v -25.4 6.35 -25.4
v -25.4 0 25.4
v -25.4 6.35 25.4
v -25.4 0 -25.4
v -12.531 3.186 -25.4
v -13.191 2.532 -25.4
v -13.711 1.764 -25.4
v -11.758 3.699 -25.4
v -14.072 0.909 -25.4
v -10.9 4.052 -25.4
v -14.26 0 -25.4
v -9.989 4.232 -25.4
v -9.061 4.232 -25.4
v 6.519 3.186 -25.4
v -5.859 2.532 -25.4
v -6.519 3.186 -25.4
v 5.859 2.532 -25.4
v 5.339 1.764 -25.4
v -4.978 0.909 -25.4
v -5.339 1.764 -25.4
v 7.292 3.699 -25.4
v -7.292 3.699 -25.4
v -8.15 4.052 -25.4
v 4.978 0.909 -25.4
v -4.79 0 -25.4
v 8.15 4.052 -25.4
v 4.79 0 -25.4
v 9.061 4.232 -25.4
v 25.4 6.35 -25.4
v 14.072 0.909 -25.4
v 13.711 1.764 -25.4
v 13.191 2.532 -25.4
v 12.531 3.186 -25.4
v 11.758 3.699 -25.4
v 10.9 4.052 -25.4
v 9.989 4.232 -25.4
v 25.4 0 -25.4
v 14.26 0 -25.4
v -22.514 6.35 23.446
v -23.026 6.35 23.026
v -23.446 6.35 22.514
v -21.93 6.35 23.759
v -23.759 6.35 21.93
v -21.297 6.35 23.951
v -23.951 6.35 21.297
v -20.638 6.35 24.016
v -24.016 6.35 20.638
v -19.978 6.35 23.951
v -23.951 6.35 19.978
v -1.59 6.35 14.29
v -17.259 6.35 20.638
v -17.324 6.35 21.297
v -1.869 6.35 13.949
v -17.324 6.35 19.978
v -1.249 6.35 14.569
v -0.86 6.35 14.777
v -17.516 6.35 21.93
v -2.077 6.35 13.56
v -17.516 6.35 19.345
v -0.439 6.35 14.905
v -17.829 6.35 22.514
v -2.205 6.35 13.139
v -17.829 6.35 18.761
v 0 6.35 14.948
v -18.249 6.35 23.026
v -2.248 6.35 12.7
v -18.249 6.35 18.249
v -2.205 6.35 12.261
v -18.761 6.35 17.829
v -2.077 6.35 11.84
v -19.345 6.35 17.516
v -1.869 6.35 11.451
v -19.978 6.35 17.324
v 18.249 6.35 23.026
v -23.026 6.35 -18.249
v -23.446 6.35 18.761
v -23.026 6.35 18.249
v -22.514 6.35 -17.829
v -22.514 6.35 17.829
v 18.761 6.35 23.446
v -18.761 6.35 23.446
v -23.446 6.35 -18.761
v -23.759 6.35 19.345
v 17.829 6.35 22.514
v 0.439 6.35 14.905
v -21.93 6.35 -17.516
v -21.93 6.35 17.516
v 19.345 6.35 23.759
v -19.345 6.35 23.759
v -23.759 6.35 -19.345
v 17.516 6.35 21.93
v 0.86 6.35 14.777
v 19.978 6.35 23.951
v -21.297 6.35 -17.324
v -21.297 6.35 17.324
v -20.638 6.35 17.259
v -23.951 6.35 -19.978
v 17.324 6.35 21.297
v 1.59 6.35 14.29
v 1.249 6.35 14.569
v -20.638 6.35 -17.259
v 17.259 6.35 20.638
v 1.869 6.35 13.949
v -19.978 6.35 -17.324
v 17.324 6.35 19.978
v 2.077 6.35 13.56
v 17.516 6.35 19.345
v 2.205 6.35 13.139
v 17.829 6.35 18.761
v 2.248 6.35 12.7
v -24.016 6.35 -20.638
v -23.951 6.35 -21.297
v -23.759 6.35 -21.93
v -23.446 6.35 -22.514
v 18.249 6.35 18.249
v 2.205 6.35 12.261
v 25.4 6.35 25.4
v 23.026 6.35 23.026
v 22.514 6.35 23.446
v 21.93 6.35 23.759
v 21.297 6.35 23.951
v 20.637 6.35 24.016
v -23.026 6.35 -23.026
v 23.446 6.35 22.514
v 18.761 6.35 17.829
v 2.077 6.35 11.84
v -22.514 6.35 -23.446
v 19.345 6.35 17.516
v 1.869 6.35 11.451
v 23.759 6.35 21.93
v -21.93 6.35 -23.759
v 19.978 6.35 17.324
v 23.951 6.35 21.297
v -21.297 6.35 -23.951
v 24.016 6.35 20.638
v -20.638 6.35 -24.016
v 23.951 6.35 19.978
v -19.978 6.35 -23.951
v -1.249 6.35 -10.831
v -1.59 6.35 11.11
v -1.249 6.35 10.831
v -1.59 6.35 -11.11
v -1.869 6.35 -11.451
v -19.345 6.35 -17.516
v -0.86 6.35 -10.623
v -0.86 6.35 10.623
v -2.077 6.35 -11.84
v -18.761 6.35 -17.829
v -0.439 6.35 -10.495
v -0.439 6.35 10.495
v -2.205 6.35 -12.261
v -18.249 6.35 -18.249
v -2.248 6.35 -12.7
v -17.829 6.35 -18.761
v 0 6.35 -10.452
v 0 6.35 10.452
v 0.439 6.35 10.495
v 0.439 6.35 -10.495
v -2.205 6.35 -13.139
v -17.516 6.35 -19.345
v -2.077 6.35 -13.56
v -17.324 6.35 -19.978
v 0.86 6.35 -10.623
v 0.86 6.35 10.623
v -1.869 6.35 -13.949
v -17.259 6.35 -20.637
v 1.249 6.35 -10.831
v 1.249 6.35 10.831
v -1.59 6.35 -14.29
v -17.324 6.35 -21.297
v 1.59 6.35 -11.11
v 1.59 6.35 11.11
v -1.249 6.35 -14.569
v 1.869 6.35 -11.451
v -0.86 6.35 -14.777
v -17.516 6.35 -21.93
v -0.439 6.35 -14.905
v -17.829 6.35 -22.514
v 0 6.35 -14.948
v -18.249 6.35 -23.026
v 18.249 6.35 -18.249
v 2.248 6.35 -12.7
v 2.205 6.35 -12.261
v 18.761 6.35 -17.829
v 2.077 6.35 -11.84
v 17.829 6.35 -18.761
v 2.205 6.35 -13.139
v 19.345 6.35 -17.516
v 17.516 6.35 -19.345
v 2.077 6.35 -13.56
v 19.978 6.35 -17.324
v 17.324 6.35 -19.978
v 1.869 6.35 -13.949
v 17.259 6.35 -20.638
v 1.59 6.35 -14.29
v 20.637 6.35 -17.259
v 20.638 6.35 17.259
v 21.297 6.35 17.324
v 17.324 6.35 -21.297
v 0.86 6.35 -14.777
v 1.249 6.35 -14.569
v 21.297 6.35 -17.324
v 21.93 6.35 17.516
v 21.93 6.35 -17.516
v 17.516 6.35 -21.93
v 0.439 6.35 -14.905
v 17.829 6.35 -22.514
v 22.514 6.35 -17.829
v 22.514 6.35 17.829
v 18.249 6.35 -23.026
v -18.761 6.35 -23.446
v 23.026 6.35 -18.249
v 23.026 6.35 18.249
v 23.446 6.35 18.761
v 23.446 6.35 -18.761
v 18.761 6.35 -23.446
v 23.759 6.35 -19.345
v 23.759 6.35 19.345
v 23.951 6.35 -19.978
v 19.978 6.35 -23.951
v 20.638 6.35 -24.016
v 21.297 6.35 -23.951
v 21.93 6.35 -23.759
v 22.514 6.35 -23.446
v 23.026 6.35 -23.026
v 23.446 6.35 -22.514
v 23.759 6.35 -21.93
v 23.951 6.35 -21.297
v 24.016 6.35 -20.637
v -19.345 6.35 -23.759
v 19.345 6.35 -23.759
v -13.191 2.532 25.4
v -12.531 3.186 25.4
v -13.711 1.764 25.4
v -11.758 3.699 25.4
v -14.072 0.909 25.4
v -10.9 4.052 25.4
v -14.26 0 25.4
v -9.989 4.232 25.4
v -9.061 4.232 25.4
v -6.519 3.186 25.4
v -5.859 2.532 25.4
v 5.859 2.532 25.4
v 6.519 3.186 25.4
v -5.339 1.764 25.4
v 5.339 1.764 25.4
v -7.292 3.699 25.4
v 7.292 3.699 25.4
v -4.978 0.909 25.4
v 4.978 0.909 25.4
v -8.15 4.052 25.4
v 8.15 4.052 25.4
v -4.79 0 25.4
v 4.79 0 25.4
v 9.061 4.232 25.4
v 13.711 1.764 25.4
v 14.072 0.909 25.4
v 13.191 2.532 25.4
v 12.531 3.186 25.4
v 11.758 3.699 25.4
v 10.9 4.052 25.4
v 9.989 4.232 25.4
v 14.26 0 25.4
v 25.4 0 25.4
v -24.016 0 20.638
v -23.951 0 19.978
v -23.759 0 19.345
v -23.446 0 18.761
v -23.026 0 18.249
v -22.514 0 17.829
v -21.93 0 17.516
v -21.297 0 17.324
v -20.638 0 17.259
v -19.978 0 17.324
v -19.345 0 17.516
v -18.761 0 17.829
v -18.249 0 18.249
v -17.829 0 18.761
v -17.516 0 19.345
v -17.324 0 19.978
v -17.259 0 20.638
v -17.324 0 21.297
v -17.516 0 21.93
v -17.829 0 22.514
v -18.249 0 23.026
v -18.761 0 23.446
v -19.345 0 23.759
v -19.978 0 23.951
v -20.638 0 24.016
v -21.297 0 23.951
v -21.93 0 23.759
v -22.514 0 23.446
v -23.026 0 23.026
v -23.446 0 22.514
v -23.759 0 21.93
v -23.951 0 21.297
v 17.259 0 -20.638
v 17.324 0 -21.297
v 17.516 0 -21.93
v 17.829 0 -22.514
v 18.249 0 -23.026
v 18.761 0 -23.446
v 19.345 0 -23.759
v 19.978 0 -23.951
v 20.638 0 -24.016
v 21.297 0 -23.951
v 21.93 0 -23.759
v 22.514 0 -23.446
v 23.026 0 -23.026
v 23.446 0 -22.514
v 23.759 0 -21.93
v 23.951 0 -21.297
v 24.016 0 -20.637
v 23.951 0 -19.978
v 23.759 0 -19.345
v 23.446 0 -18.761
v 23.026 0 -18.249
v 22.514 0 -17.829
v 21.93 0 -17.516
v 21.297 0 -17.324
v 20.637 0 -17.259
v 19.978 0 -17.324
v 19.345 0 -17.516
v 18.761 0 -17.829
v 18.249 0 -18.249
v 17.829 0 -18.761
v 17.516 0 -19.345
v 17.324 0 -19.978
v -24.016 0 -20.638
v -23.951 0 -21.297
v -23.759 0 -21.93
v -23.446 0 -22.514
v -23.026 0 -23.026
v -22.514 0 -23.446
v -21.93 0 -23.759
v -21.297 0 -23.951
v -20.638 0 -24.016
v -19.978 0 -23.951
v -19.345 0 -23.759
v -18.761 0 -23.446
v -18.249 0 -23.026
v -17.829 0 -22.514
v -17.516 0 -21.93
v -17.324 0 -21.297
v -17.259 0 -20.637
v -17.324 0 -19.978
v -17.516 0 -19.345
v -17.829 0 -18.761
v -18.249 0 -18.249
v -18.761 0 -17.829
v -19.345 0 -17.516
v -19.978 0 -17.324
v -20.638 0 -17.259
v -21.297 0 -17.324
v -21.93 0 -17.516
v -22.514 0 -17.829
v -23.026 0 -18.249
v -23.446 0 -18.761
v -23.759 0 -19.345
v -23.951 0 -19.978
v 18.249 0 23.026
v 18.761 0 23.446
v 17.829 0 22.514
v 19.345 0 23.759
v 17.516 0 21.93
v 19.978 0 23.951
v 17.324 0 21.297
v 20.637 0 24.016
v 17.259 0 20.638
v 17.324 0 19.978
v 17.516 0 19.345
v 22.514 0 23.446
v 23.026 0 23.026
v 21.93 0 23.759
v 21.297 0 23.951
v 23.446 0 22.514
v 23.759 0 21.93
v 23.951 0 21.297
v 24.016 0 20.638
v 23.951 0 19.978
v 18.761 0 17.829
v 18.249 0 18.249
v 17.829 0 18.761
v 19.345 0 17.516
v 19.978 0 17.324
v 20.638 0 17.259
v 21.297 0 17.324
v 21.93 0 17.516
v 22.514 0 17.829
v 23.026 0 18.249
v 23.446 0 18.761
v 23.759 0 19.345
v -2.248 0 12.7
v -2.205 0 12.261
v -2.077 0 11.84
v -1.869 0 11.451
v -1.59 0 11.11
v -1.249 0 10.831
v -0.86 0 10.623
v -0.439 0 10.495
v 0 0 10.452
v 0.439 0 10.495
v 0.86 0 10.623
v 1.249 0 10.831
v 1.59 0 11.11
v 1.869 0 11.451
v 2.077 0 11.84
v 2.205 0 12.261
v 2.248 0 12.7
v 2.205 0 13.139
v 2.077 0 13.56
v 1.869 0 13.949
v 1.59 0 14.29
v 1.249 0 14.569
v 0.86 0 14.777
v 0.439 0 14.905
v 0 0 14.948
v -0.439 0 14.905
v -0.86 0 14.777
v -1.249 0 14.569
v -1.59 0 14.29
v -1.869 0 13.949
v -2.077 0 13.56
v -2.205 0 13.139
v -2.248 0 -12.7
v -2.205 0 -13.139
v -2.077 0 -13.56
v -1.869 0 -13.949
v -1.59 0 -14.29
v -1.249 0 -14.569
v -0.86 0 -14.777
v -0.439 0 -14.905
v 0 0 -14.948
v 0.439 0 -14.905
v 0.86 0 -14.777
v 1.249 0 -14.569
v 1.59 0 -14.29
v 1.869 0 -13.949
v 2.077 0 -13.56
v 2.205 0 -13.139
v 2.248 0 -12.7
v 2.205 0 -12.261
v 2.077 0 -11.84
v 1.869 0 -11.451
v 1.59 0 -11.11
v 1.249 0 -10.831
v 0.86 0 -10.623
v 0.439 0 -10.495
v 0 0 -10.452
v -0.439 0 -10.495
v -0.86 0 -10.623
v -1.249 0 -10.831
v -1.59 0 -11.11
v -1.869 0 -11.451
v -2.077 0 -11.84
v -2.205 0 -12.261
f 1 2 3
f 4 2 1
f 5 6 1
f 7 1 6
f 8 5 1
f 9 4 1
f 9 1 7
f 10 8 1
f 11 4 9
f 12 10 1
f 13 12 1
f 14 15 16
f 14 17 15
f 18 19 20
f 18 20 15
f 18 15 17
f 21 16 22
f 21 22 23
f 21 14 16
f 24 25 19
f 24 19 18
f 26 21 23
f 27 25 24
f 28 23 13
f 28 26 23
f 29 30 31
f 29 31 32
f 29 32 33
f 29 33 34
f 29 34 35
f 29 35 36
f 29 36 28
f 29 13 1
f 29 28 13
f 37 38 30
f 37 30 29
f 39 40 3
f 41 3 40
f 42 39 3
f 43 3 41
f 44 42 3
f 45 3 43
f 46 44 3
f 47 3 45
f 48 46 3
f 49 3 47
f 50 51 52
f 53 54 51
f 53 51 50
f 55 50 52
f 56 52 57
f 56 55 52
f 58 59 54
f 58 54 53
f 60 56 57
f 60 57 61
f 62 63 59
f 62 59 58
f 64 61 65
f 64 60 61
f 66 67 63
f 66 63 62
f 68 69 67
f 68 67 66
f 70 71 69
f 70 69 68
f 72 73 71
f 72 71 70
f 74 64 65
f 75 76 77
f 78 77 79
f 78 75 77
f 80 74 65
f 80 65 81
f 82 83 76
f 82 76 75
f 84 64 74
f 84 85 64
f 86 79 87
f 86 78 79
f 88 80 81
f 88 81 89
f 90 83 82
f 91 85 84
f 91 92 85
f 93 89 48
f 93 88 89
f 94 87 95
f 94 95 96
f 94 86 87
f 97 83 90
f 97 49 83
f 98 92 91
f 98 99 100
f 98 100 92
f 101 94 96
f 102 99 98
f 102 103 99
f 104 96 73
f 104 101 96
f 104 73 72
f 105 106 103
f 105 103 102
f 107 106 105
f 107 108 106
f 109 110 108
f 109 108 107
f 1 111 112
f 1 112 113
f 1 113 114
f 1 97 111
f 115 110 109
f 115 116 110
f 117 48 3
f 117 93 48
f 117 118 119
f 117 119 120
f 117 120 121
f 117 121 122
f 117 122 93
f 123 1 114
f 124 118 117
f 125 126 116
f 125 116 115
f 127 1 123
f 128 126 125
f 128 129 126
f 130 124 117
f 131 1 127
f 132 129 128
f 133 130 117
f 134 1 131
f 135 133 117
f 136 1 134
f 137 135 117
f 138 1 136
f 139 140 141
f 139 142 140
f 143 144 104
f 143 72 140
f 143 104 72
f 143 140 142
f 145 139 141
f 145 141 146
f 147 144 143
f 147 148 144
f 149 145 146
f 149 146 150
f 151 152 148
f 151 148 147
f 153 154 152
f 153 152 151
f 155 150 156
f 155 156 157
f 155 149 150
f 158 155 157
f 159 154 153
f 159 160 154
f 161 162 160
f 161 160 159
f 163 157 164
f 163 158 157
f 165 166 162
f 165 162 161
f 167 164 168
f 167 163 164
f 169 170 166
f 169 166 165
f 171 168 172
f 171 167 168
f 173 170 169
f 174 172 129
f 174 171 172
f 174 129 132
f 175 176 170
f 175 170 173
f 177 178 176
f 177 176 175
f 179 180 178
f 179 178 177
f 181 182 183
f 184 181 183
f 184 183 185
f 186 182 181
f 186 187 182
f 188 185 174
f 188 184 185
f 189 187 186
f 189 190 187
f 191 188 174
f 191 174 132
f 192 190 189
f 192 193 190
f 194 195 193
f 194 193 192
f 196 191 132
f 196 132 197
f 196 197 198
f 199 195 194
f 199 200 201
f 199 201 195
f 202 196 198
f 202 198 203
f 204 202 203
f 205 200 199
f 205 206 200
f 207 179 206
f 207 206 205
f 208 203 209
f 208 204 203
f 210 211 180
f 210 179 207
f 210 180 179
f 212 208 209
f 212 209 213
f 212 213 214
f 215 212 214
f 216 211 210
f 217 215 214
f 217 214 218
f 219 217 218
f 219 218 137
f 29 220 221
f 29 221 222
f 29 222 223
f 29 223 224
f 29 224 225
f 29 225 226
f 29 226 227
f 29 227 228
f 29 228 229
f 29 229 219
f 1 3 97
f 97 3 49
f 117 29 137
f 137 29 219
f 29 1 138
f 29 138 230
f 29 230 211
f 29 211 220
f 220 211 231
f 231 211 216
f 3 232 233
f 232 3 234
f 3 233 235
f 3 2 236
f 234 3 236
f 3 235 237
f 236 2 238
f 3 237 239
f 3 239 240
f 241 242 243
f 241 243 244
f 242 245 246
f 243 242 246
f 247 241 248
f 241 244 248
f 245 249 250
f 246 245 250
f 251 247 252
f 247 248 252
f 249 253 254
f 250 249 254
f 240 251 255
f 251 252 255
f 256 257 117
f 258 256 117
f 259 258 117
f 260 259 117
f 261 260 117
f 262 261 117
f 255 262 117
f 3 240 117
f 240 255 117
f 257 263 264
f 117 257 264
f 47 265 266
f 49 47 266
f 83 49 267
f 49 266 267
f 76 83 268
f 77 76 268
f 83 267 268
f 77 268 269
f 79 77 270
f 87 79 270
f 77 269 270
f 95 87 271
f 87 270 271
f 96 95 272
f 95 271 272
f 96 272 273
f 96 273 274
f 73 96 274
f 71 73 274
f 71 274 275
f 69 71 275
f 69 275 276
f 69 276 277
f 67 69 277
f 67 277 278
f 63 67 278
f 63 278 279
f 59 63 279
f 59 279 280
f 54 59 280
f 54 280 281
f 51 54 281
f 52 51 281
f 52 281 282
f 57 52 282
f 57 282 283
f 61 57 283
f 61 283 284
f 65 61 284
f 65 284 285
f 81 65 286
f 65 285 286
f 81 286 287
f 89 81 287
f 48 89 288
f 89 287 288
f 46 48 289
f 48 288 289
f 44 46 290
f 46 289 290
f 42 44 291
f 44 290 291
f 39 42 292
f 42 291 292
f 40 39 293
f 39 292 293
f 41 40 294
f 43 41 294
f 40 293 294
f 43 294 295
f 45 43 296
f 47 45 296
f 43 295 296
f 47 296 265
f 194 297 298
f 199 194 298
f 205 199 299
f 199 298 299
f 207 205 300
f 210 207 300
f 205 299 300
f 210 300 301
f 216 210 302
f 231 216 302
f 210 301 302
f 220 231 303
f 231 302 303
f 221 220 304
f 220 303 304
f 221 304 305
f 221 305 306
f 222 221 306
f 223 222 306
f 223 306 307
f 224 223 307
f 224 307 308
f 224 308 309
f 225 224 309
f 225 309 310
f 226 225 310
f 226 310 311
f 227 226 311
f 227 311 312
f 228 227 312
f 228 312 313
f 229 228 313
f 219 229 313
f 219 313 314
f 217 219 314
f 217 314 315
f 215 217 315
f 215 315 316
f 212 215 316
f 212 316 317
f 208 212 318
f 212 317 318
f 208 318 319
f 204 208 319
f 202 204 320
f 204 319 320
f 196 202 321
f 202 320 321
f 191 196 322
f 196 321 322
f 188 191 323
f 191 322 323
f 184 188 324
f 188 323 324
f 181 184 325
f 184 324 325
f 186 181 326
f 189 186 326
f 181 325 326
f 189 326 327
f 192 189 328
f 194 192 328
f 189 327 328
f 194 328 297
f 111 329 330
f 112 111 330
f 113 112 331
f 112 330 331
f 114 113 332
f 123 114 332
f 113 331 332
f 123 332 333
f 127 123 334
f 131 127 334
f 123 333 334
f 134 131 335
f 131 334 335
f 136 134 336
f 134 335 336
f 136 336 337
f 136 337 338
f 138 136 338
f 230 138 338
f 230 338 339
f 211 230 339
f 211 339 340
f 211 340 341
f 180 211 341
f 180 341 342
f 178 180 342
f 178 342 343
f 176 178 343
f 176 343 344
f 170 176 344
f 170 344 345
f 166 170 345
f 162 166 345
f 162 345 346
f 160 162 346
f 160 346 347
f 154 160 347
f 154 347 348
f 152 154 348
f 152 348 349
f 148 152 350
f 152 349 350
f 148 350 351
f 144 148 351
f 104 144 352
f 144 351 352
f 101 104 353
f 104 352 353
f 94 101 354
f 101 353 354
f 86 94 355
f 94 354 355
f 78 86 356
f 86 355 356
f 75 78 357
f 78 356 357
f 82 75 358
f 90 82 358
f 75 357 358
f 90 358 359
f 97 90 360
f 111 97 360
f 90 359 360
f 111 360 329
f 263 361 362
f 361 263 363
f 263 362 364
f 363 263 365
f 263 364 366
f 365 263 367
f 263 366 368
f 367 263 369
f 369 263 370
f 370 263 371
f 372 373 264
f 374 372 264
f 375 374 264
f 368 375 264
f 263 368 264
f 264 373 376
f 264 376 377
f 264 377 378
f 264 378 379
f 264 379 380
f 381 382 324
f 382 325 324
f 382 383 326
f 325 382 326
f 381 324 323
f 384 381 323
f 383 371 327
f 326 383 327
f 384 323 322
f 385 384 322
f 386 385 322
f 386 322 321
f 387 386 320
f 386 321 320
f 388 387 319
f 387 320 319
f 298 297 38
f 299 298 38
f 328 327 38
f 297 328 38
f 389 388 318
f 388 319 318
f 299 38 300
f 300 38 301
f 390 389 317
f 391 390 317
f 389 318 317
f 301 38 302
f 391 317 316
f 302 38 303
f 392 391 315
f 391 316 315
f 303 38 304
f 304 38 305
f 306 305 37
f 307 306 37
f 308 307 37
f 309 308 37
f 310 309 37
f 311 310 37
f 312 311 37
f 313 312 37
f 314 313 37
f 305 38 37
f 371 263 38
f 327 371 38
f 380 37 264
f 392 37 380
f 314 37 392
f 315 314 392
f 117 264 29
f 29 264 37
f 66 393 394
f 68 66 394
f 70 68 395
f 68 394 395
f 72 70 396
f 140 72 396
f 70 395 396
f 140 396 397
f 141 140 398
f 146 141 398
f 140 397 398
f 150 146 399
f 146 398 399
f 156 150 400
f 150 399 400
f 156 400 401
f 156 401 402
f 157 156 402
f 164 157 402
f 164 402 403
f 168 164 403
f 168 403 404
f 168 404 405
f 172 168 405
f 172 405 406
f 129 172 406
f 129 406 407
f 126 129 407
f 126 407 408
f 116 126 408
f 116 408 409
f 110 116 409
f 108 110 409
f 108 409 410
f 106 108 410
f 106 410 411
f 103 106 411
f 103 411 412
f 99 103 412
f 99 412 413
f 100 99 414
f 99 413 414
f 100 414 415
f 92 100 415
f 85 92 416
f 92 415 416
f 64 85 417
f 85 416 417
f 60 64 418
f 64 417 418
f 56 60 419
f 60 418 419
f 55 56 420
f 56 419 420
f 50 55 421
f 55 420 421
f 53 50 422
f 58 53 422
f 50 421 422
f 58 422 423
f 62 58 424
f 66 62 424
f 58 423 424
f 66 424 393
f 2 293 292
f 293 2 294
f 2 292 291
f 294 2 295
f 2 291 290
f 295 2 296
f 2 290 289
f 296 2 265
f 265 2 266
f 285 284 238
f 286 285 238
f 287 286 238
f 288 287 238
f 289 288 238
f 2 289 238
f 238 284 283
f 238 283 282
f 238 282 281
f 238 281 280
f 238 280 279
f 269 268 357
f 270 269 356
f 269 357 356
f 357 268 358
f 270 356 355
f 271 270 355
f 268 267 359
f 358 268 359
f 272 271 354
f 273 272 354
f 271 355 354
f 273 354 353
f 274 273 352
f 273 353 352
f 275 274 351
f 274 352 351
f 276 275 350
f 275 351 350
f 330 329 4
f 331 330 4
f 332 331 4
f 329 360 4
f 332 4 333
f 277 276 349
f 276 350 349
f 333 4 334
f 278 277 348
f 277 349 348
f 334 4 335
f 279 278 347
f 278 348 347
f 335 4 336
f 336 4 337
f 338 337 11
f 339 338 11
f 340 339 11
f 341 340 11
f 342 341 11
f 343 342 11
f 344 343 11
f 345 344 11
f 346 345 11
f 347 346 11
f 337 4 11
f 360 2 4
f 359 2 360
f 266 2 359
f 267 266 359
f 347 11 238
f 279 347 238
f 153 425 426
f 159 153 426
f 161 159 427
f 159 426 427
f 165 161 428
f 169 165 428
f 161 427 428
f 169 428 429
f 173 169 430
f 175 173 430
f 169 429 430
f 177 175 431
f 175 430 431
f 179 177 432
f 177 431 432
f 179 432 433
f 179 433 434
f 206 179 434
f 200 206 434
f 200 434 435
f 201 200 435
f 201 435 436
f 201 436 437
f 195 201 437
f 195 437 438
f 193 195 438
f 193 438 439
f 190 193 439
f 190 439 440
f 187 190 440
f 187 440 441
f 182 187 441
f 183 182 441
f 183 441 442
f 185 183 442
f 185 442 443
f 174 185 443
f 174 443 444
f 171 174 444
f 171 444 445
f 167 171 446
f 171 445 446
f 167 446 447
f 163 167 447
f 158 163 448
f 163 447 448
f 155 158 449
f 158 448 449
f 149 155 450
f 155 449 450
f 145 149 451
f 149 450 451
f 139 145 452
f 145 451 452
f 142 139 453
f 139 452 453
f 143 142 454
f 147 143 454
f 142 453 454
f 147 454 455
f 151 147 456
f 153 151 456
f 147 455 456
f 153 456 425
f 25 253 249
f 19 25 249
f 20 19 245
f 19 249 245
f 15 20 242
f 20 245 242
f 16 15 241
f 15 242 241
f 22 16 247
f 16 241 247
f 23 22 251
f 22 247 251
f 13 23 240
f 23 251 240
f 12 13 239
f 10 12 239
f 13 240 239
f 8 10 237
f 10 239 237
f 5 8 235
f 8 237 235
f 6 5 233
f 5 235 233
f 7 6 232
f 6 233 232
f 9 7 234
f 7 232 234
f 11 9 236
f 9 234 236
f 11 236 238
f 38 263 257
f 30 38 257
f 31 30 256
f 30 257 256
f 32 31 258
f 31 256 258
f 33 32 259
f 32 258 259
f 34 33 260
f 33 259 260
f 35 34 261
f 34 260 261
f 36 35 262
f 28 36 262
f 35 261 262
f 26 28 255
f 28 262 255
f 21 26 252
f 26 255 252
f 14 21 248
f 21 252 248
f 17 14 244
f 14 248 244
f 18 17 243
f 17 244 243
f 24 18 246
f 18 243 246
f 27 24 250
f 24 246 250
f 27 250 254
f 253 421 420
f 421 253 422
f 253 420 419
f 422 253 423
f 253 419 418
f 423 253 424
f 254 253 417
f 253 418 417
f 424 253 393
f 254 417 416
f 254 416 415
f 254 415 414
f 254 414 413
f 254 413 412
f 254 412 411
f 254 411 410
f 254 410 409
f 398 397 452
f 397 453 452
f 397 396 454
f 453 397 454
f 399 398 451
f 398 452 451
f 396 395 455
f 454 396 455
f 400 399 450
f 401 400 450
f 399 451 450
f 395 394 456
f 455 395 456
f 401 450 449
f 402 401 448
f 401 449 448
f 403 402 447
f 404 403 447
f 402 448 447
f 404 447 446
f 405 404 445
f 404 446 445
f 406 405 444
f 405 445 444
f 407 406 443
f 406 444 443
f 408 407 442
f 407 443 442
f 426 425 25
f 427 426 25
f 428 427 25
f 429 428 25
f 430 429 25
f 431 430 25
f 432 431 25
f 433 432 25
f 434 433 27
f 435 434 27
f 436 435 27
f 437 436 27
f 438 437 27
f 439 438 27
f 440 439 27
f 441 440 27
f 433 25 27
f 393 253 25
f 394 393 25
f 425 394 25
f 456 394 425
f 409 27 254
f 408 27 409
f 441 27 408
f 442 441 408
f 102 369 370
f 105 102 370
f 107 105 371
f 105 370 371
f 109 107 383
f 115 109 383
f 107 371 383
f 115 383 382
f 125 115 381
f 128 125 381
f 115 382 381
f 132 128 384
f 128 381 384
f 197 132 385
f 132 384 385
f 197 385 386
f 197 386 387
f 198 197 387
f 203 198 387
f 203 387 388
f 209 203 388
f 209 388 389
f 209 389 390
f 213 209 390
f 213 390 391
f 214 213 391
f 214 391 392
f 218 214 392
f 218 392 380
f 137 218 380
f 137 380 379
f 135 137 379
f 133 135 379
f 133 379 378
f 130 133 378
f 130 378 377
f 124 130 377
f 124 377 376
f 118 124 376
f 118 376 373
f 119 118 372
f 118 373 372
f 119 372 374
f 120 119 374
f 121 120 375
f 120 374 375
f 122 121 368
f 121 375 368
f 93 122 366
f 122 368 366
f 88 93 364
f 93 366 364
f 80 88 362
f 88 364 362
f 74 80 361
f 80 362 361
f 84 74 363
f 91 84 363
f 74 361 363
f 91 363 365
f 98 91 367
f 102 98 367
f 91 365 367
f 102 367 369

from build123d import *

# Parameters (mm, degrees)
SKETCH1_W               = 50.8
SKETCH1_H               = 50.8
BOSS_EXTRUDE1_DEPTH     = 6.35
SKETCH2_R               = 4.7625
CUT_EXTRUDE1_DEPTH      = 58.15
F_1_4_CLEARANCE_HOLE1_D = 6.7564
F_8_CLEARANCE_HOLE1_D   = 4.4958


with BuildPart() as part:
    # Sketch1 → Boss-Extrude1 (new body)
    with BuildSketch(Plane(origin=(0, 0, 0), x_dir=(1, 0, 0), z_dir=(0, 1, 0))):
        Rectangle(SKETCH1_W, SKETCH1_H)
    extrude(amount=BOSS_EXTRUDE1_DEPTH)

    # Sketch2 → Cut-Extrude1 (cut, through all)
    with BuildSketch(Plane.XY.offset(25.4)):
        with Locations((-9.525, -0.508)):
            Circle(SKETCH2_R)
        with Locations((9.525, -0.508)):
            Circle(SKETCH2_R)
    extrude(amount=-CUT_EXTRUDE1_DEPTH, mode=Mode.SUBTRACT)

    # 1/4 Clearance Hole1 (through all)
    with Locations(Plane(origin=(0, 6.35, 0), x_dir=(1, 0, 0), z_dir=(0, 1, 0))):
        with Locations((-20.6375, -20.6375), (-20.6375, 20.6375), (20.6375, 20.6375), (20.6375, -20.6375)):
            Hole(F_1_4_CLEARANCE_HOLE1_D / 2)

    # #8 Clearance Hole1 (through all)
    with Locations(Plane(origin=(0, 6.35, 0), x_dir=(1, 0, 0), z_dir=(0, 1, 0))):
        with Locations((0, 12.7), (0, -12.7)):
            Hole(F_8_CLEARANCE_HOLE1_D / 2)


solid = part.part
